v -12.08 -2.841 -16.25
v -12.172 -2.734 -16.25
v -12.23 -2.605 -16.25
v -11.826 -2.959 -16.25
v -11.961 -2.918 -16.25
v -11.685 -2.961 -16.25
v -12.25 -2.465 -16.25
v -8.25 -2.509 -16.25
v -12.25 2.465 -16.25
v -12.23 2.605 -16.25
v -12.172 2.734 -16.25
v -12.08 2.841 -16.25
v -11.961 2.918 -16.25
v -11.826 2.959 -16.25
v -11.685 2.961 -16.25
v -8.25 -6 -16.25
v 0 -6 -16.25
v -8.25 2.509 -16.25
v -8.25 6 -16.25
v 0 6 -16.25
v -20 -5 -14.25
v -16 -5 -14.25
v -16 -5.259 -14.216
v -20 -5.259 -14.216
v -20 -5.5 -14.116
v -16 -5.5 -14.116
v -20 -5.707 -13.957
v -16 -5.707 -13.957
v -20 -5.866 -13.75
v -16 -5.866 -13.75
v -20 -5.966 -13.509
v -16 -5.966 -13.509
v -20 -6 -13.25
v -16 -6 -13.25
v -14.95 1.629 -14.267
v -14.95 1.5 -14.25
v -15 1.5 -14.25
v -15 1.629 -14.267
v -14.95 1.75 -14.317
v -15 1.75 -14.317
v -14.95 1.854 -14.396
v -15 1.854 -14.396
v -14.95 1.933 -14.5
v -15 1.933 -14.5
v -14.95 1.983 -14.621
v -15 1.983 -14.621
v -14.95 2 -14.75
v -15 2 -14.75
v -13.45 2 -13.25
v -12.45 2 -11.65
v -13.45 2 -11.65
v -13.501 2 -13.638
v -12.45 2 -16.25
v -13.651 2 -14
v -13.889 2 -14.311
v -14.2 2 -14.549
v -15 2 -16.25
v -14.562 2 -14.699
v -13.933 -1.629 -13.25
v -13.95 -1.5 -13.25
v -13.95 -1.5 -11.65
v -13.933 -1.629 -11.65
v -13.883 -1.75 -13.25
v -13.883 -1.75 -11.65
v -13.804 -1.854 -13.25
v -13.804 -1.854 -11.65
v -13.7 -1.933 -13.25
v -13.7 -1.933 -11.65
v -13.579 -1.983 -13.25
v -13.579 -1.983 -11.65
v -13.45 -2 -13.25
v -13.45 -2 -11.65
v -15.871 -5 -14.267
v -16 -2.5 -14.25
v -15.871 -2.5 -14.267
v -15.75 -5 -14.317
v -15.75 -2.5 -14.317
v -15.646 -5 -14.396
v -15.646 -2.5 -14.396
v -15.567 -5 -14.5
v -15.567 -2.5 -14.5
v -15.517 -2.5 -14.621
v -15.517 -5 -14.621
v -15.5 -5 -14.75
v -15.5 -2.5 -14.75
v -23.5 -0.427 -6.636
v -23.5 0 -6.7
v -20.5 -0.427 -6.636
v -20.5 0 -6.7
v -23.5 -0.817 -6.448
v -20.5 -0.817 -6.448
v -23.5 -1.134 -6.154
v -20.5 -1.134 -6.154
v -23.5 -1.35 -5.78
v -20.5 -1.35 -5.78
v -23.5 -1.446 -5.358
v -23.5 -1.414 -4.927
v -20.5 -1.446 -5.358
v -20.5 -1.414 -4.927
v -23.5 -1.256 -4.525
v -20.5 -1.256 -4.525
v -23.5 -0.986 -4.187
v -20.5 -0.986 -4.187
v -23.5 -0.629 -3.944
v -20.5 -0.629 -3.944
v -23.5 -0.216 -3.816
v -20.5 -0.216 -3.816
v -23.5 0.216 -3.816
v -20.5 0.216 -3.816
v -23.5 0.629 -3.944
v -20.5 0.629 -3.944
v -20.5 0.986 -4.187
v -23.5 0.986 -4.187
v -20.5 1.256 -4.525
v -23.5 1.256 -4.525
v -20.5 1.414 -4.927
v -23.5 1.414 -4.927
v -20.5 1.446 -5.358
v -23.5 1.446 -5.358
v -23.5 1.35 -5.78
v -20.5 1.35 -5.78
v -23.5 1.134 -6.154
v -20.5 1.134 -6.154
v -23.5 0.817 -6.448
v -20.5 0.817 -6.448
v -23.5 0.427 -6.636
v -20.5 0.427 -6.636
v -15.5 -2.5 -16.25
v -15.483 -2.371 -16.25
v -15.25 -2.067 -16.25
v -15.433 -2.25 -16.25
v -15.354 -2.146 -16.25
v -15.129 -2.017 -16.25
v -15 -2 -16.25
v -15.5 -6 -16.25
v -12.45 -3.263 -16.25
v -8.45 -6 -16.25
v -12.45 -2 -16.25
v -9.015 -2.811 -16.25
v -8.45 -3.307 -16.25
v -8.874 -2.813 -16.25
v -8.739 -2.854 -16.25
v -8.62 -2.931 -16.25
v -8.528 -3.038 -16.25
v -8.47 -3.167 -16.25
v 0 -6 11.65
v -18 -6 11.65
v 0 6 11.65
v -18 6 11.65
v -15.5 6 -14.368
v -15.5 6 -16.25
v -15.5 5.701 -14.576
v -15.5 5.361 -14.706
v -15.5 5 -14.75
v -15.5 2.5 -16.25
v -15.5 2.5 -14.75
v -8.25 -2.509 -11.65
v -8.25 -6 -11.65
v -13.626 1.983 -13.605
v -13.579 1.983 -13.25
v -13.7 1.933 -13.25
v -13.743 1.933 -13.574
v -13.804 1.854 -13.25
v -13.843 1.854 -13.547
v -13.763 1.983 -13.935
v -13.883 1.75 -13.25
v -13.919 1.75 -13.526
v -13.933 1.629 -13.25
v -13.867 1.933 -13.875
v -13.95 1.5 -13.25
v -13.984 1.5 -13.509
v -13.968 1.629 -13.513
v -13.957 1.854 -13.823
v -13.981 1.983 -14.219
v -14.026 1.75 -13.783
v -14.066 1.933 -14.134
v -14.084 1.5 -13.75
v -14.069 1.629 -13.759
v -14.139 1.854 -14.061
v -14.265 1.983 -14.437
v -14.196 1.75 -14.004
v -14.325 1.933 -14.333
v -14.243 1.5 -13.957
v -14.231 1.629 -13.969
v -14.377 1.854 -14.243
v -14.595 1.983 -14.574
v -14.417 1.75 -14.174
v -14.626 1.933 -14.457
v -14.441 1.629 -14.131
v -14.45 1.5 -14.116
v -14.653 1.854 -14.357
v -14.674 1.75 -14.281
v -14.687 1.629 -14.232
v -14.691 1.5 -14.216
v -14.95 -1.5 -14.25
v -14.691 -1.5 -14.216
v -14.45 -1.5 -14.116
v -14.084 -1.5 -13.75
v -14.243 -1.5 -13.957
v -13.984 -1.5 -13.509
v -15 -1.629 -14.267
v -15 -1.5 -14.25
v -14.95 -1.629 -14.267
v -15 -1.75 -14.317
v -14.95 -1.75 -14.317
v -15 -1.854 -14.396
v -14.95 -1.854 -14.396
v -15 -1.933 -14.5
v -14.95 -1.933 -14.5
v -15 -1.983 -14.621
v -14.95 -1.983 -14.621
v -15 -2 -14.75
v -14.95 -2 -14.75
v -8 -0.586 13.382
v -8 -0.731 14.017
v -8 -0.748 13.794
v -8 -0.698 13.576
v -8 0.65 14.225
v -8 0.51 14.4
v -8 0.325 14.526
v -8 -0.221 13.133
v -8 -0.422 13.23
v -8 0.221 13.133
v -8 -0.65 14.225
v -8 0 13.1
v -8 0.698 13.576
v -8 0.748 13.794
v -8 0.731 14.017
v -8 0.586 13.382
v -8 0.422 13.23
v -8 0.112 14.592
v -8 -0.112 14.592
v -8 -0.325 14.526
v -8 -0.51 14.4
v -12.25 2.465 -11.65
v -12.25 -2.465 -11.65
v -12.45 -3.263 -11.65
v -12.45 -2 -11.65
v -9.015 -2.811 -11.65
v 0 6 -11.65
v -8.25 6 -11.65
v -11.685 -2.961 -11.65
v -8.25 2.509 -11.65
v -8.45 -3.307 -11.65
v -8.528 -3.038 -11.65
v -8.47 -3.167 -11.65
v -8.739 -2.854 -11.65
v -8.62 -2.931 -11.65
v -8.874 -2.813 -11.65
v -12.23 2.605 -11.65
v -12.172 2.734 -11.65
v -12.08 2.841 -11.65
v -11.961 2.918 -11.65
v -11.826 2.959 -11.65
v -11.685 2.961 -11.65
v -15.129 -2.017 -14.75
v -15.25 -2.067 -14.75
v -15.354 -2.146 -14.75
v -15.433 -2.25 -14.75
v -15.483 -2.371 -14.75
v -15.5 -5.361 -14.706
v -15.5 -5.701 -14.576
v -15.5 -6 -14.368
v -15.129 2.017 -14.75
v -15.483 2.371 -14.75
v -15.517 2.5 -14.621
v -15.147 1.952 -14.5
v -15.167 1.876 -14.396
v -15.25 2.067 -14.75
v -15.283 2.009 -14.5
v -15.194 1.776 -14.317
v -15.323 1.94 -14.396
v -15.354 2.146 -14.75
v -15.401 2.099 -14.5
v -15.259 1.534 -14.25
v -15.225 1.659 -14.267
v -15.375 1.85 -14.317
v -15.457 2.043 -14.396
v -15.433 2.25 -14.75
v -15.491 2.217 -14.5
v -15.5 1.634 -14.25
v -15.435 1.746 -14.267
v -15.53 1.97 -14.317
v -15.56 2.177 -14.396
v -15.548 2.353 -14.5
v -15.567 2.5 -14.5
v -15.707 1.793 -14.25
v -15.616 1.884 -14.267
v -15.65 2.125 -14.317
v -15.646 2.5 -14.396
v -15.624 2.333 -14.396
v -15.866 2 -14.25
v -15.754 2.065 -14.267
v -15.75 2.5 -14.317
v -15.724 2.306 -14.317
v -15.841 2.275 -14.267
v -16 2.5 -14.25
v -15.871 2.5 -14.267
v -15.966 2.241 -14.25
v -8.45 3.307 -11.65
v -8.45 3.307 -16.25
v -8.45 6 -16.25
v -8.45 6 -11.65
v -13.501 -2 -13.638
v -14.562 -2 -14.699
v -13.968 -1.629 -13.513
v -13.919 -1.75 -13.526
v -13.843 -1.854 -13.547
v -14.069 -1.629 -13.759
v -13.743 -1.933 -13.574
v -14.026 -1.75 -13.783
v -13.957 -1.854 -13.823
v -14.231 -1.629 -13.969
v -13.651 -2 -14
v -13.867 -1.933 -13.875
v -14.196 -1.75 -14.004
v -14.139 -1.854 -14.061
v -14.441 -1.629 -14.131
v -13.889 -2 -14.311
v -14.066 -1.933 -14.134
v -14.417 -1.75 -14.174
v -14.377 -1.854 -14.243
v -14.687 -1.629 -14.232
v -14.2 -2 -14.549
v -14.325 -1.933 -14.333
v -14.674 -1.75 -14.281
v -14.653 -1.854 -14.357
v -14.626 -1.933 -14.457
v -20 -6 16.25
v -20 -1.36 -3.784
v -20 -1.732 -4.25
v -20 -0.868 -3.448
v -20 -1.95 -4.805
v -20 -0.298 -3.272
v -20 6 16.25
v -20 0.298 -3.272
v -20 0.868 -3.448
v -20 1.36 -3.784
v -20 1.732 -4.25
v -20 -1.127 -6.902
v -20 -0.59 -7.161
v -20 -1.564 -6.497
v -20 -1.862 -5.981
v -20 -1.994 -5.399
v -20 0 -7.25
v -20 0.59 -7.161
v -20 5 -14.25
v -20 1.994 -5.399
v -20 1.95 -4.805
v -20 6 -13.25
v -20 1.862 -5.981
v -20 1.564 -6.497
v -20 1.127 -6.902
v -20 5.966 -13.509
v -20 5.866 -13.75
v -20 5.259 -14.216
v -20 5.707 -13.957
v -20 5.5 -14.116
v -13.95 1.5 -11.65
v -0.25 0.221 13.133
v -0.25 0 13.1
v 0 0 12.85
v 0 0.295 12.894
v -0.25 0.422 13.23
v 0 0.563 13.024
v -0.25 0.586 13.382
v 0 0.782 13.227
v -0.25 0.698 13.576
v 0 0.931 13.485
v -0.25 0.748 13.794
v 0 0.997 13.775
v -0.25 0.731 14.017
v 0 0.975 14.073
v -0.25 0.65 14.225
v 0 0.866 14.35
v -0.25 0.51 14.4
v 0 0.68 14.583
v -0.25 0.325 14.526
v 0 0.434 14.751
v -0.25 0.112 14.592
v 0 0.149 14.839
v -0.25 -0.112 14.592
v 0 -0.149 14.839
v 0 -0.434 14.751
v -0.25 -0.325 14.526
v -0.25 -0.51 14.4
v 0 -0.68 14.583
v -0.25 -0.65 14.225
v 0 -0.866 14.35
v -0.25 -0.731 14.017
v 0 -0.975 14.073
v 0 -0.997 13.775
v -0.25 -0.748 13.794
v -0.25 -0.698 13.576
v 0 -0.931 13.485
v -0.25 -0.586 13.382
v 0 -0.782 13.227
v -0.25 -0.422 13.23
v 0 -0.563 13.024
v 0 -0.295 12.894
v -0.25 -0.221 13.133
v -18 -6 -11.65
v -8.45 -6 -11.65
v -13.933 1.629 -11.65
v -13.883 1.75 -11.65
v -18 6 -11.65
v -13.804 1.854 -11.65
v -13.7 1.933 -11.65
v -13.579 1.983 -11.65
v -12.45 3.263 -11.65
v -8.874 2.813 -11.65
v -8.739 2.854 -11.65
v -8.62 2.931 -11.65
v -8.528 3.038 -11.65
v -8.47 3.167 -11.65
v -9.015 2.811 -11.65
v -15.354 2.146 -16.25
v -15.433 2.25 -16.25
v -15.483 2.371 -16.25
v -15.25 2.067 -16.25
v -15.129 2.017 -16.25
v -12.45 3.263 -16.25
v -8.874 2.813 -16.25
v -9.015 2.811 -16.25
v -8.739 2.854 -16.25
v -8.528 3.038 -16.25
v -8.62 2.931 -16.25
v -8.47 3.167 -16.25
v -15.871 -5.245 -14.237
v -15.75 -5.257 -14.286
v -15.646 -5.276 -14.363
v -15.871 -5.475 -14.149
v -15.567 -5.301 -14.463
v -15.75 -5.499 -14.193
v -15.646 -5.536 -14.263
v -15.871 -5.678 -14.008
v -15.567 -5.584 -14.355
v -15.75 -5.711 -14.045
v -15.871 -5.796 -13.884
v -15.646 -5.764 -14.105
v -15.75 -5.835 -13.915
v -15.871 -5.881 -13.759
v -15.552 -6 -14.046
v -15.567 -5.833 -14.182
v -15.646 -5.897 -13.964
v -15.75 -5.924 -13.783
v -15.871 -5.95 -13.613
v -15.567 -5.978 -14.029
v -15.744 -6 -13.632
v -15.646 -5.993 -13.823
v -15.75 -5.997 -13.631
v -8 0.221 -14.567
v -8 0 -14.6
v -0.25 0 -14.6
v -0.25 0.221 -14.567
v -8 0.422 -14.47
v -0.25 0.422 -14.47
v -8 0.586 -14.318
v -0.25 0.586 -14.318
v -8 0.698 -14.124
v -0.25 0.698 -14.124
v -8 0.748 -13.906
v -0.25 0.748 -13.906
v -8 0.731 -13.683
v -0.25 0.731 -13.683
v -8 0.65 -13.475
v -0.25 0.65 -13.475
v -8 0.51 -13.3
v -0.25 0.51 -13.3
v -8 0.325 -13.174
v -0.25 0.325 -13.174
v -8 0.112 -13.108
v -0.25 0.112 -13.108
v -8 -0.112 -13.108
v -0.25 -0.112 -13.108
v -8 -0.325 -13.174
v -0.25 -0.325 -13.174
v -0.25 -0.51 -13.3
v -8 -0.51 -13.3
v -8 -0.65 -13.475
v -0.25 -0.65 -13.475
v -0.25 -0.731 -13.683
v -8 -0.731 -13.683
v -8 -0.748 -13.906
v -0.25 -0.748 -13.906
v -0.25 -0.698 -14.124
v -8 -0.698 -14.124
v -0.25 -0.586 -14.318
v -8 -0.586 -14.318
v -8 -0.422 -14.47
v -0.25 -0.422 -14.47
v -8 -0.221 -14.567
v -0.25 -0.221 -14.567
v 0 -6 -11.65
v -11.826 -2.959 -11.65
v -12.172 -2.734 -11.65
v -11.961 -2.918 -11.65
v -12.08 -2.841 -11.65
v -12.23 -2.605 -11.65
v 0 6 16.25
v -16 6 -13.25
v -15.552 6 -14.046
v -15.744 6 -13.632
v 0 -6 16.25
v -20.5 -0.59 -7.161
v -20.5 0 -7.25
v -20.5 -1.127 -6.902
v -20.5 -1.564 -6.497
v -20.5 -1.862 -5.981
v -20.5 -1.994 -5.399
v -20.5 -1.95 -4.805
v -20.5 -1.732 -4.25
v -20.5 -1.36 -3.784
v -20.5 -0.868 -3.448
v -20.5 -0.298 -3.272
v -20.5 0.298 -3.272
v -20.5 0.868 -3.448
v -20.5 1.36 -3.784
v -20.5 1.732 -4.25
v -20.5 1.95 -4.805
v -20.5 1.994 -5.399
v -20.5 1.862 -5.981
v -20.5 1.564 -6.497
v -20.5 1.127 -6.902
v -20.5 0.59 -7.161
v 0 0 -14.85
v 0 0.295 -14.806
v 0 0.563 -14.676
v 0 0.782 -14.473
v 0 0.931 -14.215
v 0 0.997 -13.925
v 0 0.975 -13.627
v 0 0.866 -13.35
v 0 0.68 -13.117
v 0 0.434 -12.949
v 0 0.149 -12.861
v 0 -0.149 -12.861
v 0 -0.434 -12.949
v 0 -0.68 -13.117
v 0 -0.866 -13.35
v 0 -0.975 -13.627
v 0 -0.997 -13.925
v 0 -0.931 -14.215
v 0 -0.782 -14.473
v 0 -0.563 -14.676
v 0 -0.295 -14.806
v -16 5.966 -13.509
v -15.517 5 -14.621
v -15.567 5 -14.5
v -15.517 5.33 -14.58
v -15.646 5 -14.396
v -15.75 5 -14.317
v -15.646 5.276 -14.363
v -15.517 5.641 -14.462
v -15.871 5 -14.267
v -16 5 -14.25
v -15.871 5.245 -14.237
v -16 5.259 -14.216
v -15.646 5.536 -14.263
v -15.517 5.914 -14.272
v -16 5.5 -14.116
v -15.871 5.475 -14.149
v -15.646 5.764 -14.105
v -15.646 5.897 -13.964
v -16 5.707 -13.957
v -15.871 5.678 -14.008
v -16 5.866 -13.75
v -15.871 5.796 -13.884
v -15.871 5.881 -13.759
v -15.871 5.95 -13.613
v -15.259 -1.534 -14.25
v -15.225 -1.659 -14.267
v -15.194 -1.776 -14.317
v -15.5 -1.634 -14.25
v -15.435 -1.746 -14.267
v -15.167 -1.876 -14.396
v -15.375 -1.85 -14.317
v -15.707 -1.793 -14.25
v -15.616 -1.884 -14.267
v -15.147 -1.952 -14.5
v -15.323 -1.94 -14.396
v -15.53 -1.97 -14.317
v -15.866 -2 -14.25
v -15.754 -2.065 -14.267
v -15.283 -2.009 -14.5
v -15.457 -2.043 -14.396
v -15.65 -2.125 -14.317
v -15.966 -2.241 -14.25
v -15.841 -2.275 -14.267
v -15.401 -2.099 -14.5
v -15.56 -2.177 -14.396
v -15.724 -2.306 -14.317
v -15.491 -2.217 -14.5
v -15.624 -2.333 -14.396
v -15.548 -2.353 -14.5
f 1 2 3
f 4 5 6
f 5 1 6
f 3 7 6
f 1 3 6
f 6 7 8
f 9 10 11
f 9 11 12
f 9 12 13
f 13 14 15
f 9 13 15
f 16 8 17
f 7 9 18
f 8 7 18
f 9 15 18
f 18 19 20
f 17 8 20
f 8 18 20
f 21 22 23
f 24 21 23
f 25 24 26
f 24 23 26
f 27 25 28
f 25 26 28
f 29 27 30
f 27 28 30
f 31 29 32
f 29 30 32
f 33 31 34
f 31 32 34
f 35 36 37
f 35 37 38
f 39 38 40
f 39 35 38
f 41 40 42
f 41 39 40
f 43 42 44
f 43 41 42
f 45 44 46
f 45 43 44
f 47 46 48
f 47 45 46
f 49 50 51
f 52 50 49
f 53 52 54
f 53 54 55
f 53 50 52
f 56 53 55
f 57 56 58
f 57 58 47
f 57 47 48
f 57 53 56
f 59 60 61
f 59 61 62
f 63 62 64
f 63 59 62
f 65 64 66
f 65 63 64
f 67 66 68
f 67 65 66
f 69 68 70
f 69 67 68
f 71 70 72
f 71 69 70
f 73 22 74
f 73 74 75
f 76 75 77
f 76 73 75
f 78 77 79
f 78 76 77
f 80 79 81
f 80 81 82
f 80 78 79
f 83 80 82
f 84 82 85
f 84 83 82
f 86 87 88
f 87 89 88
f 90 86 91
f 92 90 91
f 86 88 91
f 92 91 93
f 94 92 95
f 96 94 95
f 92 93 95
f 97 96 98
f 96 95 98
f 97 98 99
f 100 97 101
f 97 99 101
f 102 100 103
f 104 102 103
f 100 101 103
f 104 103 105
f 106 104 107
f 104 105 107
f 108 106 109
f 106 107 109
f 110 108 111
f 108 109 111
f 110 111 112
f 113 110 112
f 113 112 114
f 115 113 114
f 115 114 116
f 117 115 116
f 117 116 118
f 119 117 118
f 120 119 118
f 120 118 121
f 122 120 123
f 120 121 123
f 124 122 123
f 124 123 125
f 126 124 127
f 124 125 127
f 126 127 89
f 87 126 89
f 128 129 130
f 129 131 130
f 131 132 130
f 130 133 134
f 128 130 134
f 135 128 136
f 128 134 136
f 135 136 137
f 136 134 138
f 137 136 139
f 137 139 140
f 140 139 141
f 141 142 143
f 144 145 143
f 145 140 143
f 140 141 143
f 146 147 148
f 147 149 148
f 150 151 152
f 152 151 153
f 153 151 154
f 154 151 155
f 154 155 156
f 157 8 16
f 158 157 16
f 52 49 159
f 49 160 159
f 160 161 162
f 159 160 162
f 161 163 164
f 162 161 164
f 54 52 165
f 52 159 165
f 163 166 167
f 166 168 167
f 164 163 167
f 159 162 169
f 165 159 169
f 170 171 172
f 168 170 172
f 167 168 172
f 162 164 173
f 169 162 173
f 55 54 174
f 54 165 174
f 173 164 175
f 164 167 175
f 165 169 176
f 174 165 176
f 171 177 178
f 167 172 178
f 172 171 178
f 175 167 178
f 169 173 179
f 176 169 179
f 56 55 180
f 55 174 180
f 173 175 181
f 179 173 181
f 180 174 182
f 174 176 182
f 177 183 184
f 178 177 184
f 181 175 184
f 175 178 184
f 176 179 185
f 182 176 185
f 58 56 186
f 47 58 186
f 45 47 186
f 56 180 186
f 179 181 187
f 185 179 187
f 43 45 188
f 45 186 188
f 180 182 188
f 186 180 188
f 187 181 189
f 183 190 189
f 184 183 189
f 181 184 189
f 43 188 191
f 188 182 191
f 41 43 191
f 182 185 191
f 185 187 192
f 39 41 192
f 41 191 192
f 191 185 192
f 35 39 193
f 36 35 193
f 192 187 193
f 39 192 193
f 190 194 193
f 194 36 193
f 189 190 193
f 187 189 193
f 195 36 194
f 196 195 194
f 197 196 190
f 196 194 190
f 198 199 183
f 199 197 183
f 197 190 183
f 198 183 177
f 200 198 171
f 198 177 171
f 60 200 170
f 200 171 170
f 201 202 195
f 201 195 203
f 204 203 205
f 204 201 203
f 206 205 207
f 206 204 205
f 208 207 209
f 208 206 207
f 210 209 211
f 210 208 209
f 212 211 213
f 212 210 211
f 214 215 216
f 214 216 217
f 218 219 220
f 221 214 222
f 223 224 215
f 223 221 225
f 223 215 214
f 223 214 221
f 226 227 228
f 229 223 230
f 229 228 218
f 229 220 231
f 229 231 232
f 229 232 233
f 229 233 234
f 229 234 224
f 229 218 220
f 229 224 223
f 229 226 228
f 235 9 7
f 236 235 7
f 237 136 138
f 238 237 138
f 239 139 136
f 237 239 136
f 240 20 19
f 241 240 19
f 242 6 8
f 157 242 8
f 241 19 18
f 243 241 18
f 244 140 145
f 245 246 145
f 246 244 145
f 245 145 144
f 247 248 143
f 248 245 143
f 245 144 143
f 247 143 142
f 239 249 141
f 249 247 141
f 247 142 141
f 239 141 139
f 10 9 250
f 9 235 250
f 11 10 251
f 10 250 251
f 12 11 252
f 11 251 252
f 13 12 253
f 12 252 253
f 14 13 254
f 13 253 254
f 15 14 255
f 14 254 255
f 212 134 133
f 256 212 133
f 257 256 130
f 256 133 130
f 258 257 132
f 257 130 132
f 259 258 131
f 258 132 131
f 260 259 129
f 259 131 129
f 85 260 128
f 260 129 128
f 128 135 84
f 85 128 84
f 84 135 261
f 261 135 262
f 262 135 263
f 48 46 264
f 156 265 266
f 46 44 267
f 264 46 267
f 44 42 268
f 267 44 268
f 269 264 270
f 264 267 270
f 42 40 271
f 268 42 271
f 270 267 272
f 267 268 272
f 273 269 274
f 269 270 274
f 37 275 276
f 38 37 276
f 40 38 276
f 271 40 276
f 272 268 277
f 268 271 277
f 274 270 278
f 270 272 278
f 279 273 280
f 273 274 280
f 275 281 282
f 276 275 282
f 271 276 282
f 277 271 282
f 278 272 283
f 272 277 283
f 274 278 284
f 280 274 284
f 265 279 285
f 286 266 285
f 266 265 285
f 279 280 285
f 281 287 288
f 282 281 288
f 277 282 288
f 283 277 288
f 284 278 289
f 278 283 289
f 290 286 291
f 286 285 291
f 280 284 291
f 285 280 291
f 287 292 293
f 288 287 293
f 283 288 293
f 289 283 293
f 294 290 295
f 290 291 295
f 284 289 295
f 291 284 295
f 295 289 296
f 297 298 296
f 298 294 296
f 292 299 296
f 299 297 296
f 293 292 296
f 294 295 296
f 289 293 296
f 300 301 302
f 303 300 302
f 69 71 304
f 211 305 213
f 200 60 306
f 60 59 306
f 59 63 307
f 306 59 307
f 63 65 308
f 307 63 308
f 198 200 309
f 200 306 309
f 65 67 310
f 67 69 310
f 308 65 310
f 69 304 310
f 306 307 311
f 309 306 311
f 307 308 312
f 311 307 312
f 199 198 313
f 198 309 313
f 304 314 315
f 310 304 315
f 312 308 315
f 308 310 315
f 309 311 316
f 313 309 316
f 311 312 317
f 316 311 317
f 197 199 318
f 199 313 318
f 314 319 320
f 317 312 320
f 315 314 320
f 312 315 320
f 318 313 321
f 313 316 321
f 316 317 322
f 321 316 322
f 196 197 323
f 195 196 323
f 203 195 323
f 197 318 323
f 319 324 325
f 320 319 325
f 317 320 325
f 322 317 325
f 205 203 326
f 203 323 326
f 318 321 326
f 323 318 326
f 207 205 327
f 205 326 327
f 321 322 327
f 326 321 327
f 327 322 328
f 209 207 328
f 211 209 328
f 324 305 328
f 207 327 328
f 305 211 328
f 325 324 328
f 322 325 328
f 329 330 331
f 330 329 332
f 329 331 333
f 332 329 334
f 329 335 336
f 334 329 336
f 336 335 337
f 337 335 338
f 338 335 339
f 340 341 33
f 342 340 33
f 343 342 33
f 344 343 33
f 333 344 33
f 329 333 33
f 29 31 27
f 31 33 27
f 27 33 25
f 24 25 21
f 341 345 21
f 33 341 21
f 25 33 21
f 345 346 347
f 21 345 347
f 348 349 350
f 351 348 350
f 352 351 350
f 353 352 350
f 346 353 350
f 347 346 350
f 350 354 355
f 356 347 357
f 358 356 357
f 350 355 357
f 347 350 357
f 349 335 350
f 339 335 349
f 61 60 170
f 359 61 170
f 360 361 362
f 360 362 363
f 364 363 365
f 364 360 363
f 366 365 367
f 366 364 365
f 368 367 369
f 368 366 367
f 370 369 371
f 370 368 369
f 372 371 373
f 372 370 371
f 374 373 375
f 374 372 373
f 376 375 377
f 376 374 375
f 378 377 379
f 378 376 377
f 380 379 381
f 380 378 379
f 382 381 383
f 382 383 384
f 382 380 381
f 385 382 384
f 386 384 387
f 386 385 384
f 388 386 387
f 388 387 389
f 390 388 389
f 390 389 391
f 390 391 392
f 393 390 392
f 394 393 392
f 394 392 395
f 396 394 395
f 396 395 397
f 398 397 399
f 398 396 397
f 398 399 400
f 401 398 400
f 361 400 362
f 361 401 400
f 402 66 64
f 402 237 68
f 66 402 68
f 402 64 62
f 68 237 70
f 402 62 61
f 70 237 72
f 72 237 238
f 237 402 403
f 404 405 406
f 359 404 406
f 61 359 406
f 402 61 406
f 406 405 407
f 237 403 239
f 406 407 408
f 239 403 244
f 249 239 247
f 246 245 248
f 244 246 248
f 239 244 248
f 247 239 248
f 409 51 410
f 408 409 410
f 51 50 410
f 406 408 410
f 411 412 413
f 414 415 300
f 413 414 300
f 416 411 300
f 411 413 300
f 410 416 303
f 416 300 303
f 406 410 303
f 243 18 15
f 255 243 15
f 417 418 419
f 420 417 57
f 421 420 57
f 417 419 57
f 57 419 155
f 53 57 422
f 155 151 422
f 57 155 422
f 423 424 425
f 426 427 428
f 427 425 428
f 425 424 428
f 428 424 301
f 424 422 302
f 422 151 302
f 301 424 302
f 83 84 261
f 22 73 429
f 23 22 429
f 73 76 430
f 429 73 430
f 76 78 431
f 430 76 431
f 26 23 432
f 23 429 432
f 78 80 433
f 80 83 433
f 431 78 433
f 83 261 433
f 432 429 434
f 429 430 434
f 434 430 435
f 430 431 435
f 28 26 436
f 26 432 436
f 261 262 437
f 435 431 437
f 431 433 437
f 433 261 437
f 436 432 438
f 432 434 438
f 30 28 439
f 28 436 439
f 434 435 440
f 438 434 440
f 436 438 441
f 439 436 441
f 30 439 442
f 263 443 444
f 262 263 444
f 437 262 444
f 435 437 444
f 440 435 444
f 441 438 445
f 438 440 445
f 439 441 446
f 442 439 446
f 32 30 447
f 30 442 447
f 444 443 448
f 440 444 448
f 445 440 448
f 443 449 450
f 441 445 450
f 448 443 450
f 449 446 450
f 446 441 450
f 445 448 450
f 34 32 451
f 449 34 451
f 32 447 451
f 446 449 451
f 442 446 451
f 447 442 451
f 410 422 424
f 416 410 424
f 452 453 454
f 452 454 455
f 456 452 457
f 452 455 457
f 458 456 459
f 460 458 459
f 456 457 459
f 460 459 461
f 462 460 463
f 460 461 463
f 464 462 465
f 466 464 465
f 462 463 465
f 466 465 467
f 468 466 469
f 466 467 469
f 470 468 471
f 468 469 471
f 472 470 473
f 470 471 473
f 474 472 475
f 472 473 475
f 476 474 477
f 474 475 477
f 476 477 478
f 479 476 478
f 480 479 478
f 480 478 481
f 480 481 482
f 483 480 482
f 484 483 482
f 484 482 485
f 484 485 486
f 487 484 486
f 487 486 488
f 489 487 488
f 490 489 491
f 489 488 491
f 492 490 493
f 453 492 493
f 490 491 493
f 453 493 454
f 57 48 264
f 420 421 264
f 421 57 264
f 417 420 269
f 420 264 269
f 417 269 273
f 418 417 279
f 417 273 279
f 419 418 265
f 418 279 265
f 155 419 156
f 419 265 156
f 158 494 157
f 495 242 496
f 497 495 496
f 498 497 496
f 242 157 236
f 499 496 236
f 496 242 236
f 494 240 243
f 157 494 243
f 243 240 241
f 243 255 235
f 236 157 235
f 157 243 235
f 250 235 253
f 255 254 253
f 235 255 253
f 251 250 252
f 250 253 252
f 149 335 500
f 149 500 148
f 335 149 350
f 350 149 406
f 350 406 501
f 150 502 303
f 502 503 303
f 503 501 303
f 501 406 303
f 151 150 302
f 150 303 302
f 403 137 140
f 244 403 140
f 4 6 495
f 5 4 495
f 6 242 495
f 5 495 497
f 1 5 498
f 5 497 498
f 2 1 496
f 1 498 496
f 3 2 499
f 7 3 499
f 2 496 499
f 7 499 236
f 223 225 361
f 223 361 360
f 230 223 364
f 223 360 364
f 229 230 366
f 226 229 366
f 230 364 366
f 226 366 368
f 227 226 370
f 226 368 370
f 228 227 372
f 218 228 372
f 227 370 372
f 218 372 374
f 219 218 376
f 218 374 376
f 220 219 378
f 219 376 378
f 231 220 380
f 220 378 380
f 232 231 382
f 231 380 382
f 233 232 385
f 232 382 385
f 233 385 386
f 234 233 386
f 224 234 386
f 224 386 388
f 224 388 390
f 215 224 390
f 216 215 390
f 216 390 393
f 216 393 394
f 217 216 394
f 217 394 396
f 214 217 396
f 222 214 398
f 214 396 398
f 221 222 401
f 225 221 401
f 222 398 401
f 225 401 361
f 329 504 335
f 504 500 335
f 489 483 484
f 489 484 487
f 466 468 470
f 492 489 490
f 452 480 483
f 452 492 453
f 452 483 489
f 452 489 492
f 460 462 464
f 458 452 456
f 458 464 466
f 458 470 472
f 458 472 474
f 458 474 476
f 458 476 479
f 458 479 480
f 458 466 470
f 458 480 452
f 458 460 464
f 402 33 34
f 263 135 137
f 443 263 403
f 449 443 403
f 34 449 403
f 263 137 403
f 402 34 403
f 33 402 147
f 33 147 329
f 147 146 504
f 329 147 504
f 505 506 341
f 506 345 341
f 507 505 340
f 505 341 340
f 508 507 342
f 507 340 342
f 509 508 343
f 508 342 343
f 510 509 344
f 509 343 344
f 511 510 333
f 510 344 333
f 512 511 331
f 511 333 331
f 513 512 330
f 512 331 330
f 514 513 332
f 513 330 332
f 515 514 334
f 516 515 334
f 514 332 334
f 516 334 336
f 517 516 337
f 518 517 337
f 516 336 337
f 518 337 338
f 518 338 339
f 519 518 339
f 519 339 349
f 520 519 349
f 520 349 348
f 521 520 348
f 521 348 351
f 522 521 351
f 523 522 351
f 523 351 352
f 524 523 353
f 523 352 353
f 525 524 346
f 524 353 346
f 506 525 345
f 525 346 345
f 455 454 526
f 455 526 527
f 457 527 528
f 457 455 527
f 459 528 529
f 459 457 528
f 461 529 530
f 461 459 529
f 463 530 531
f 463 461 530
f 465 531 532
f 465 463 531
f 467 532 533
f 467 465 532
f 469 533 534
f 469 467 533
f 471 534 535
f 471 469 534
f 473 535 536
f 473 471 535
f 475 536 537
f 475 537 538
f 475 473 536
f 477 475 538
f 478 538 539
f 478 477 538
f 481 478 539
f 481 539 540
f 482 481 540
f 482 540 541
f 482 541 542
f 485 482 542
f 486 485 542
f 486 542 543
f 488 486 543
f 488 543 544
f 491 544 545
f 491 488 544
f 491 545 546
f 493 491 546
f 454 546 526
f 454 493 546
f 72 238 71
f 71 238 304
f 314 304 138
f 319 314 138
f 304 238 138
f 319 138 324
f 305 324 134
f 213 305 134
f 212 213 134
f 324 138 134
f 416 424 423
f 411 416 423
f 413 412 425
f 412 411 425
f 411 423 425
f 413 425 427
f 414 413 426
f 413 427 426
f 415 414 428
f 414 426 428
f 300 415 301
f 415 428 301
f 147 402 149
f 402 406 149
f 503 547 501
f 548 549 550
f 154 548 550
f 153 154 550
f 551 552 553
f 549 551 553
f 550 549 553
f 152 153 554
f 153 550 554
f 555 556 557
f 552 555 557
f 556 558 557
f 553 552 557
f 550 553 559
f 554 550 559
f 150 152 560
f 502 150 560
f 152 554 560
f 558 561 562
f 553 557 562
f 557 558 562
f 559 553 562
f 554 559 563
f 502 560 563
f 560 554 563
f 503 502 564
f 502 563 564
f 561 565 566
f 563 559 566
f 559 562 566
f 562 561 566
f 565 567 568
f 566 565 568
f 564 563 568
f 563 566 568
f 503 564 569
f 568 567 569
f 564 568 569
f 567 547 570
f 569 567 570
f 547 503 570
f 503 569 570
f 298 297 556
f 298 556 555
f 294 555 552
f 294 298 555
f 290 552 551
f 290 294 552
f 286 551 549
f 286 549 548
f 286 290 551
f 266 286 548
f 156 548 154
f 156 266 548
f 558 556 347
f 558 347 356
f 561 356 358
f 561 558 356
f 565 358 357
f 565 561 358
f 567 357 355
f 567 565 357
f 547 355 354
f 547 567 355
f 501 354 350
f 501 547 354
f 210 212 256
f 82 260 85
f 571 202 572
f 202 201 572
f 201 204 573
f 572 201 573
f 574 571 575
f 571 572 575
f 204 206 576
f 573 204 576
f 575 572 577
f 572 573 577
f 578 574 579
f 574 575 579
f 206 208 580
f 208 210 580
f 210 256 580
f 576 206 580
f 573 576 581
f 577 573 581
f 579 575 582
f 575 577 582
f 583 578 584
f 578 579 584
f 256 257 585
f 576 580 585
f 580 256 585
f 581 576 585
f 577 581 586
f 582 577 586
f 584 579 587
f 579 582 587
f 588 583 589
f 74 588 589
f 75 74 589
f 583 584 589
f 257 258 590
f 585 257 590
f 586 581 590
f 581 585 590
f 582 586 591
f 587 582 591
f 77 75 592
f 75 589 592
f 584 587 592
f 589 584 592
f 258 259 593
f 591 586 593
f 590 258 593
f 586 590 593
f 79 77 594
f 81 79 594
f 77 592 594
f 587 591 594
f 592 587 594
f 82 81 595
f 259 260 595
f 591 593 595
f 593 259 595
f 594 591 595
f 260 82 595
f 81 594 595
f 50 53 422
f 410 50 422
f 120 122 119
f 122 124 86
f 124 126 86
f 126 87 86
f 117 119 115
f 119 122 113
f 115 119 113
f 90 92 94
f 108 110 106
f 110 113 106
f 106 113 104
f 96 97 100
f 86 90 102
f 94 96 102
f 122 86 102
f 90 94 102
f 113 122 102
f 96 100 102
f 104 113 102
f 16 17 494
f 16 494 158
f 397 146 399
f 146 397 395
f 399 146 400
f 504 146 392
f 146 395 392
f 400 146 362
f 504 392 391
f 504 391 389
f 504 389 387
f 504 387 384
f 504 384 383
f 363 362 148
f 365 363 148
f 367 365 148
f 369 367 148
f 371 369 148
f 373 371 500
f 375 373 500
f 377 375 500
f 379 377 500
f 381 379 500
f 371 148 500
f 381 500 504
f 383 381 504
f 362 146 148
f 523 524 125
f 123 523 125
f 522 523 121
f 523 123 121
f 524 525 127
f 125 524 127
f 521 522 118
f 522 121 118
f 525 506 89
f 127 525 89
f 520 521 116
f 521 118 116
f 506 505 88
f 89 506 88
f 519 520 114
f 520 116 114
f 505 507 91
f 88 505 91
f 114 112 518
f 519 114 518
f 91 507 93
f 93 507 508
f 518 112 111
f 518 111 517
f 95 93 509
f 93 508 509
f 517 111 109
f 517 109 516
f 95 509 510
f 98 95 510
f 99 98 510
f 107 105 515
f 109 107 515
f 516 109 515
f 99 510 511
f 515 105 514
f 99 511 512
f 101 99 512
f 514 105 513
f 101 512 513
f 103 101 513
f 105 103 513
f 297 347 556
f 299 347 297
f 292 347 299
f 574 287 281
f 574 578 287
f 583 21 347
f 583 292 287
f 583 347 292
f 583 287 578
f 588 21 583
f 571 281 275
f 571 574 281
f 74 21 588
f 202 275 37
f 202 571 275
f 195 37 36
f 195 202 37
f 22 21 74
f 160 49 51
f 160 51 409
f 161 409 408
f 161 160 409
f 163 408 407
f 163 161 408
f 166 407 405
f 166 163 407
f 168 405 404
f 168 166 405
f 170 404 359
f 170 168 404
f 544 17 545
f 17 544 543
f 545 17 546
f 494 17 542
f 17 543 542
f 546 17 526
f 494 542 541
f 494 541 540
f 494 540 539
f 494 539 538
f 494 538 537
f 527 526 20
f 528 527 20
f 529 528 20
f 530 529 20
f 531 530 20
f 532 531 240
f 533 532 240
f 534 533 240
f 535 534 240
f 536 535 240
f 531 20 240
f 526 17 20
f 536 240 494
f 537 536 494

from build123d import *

# Parameters (mm, degrees)
BOSS_EXTRUDE1_DEPTH = 6
SKETCH4_R           = 0.75
CUT_EXTRUDE3_DEPTH  = 8
CHAMFER1_SIZE       = 0.25
CUT_EXTRUDE1_REACH  = 40.63
SKETCH2_W           = 1.5
SKETCH2_H           = 4
SKETCH5_W           = 6.05
SKETCH5_H           = 4
CUT_EXTRUDE5_DEPTH  = 2
SKETCH6_W           = 4.5
SKETCH6_H           = 2
CUT_EXTRUDE6_DEPTH  = 29.426440157
FILLET7_R           = 1
CUT_EXTRUDE2_REACH  = 40.63
FILLET9_R           = 0.5
FILLET3_R           = 0.5


with BuildPart() as part:
    # Sketch1 → Boss-Extrude1 (new, symmetric)
    with BuildSketch(Plane(origin=(0, 0, 0), x_dir=(1, 0, 0), z_dir=(0, 1, 0))):
        Polygon((0, 16.25), (0, 11.65), (-18, 11.65), (-18, -11.65), (0, -11.65), (0, -16.25), (-20, -16.25), (-20, 16.25), align=None)
    extrude(amount=BOSS_EXTRUDE1_DEPTH, both=True)

    # Sketch4 → Cut-Extrude3 (cut)
    with BuildSketch(Plane(origin=(0, 0, 0), x_dir=(0, 0, -1), z_dir=(1, 0, 0))):
        with Locations((13.85, 0)):
            Circle(SKETCH4_R)
        with Locations((-13.85, 0)):
            Circle(SKETCH4_R)
    extrude(amount=-CUT_EXTRUDE3_DEPTH, mode=Mode.SUBTRACT)

    # Chamfer1
    chamfer1_edges = [part.edges().sort_by_distance(p)[0] for p in [
        (0, 0, -13.1),
        (0, 0, 14.6),
    ]]
    chamfer(chamfer1_edges, length=CHAMFER1_SIZE)

    # Sketch2 → Cut-Extrude1 (cut, up to next)
    with BuildSketch(Plane(origin=(0, 0, -16.25), x_dir=(-1, 0, 0), z_dir=(0, 0, -1)), mode=Mode.PRIVATE) as cut_extrude1_sk1:
        with Locations((13.2, 0)):
            Rectangle(SKETCH2_W, SKETCH2_H)
    cut_extrude1_tool1 = extrude(cut_extrude1_sk1.sketch, amount=-CUT_EXTRUDE1_REACH, mode=Mode.PRIVATE) & part.part
    add(cut_extrude1_tool1.solids().sort_by_distance((-13.2, 0, -16.25))[0], mode=Mode.SUBTRACT)

    # Sketch5 → Cut-Extrude5 (cut)
    with BuildSketch(Plane(origin=(0, 0, -16.25), x_dir=(-1, 0, 0), z_dir=(0, 0, -1))):
        with Locations((16.975, 0)):
            Rectangle(SKETCH5_W, SKETCH5_H)
    extrude(amount=-CUT_EXTRUDE5_DEPTH, mode=Mode.SUBTRACT)

    # Sketch6 → Cut-Extrude6 (cut, through all)
    with BuildSketch(Plane.XZ.offset(6)):
        with Locations((-17.75, -15.25)):
            Rectangle(SKETCH6_W, SKETCH6_H)
    extrude(amount=-CUT_EXTRUDE6_DEPTH, mode=Mode.SUBTRACT)

    # Fillet7
    fillet7_edges = [part.edges().sort_by_distance(p)[0] for p in [
        (-13.95, 0, -14.25),
        (-17.75, 6, -14.25),
        (-17.75, -6, -14.25),
    ]]
    fillet(fillet7_edges, radius=FILLET7_R)

    # Sketch3 → Cut-Extrude2 (cut, up to next)
    with BuildSketch(Plane(origin=(0, 0, -16.25), x_dir=(-1, 0, 0), z_dir=(0, 0, -1)), mode=Mode.PRIVATE) as cut_extrude2_sk1:
        Polygon((8.45, -6), (8.45, -2.736695005), (12.45, -3.263304995), (12.45, 3.263304995), (8.45, 2.736695005), (8.45, 6), (8.25, 6), (8.25, 2.508638713), (12.25, 3.035248704), (12.25, -3.035248704), (8.25, -2.508638713), (8.25, -6), align=None)
    cut_extrude2_tool1 = extrude(cut_extrude2_sk1.sketch, amount=-CUT_EXTRUDE2_REACH, mode=Mode.PRIVATE) & part.part
    add(cut_extrude2_tool1.solids().sort_by_distance((-8.322862, -4.368348, -16.25))[0], mode=Mode.SUBTRACT)


with BuildPart() as cut_extrude2_piece_1:
    # of the separate pieces the step leaves, piece 1, a body of its own (cut_extrude2_pieces)
    add(part.part.solids().sort_by_distance((-13.95, -2, -13.25))[0])

    # Fillet9
    # the kernel refuses this fillet: 0.5 mm, written as the material it takes off along each edge
    with BuildSketch(Plane(origin=(-15.5, -2, -17.5), x_dir=(1, 0, 0), z_dir=(0, 0, 1)), Plane(origin=(-15.5, 2, -14.25), x_dir=(1, 0, 0), z_dir=(0, 0, -1))) as fillet9_piece_1:
        with BuildLine():
            CenterArc((FILLET9_R, -FILLET9_R), FILLET9_R, 90, 90)
            Line((0, -FILLET9_R), (0, 0))
            Line((0, 0), (FILLET9_R, 0))
        make_face()
    extrude(amount=3.25, mode=Mode.SUBTRACT)
    with BuildSketch(Plane(origin=(-8.45, 2.736695005, -17.675351823), x_dir=(-0.9914448613738108, 0.1305261922200488, 0), z_dir=(0, 0, 1)), Plane(origin=(-8.45, -2.736695005, -17.675351823), x_dir=(0, -1, 0), z_dir=(0, 0, 1))) as fillet9_piece_2:
        with BuildLine():
            CenterArc((FILLET9_R * 1.14028145817, -FILLET9_R), FILLET9_R, 90, 97.5)
            Line((FILLET9_R * 0.148836596794, -FILLET9_R * 1.13052619222), (0, 0))
            Line((0, 0), (FILLET9_R * 1.14028145817, 0))
        make_face()
    extrude(amount=7.450703645, mode=Mode.SUBTRACT)
    # the kernel refuses this fillet: 0.5 mm, written as the material it adds along each edge
    with BuildSketch(Plane(origin=(-13.95, -2, -13.25), x_dir=(0, 1, 0), z_dir=(0, 0, 1))) as fillet9_2_piece_1:
        with BuildLine():
            CenterArc((FILLET9_R, -FILLET9_R), FILLET9_R, 90, 90)
            Line((0, -FILLET9_R), (0, 0))
            Line((0, 0), (FILLET9_R, 0))
        make_face()
    extrude(amount=1.6)
    with BuildSketch(Plane(origin=(-14.95, -2, -13.25), x_dir=(1, 0, 0), z_dir=(0, 0, 1))) as fillet9_2_piece_2:
        with BuildLine():
            CenterArc((1 + FILLET9_R, FILLET9_R), FILLET9_R, 180, 90)
            Line((1, FILLET9_R), (1, 0))
            Line((1, 0), (1 + FILLET9_R, 0))
        make_face()
    revolve(axis=Axis((-14.95, -2, -13.25), (0, 1, 0)), revolution_arc=90)
    with BuildSketch(Plane(origin=(-13.95, 2, -13.25), x_dir=(0, -1, 0), z_dir=(0, 0, 1))) as fillet9_2_piece_3:
        with BuildLine():
            CenterArc((FILLET9_R, FILLET9_R), FILLET9_R, 180, 90)
            Line((0, FILLET9_R), (0, 0))
            Line((0, 0), (FILLET9_R, 0))
        make_face()
    extrude(amount=1.6)
    with BuildSketch(Plane(origin=(-14.95, 2, -13.25), x_dir=(1, 0, 0), z_dir=(0, 0, 1))) as fillet9_2_piece_4:
        with BuildLine():
            CenterArc((1 + FILLET9_R, -FILLET9_R), FILLET9_R, 90, 90)
            Line((1 + FILLET9_R, 0), (1, 0))
            Line((1, 0), (1, -FILLET9_R))
        make_face()
    revolve(axis=Axis((-14.95, 2, -13.25), (0, 1, 0)), revolution_arc=90)
    with BuildSketch(Plane(origin=(-15.5, 2.5, -14.25), x_dir=(-1, 0, 0), z_dir=(0, 1, 0)), Plane(origin=(-15.5, -5, -14.25), x_dir=(-1, 0, 0), z_dir=(0, 1, 0))) as fillet9_2_piece_5:
        with BuildLine():
            CenterArc((FILLET9_R, -FILLET9_R), FILLET9_R, 90, 90)
            Line((0, -FILLET9_R), (0, 0))
            Line((0, 0), (FILLET9_R, 0))
        make_face()
    extrude(amount=2.5)
    with BuildSketch(Plane(origin=(-14.95, 2, -14.25), x_dir=(0, 0, -1), z_dir=(-1, 0, 0)), Plane(origin=(-15, -2, -14.25), x_dir=(0, 0, -1), z_dir=(1, 0, 0))) as fillet9_2_piece_6:
        with BuildLine():
            CenterArc((FILLET9_R, FILLET9_R), FILLET9_R, 180, 90)
            Line((0, FILLET9_R), (0, 0))
            Line((0, 0), (FILLET9_R, 0))
        make_face()
    extrude(amount=0.05)
    with BuildSketch(Plane(origin=(-15.5, 5, -13.25), x_dir=(0, 0, -1), z_dir=(0, -1, 0))) as fillet9_2_piece_7_section:
        with BuildLine():
            CenterArc((1 + FILLET9_R, -FILLET9_R), FILLET9_R, 90, 90)
            Line((1 + FILLET9_R, 0), (1, 0))
            Line((1, 0), (1, -FILLET9_R))
        make_face()
    fillet9_2_piece_7 = revolve(axis=Axis((-15.5, 5, -13.25), (1, 0, 0)), revolution_arc=161.648494619, mode=Mode.PRIVATE)
    fillet9_2_piece_7 = split(fillet9_2_piece_7, bisect_by=Plane(origin=(-15.636075231, 6, -13.981098286), z_dir=(0, -1, 0)), keep=Keep.TOP, mode=Mode.PRIVATE)
    add(fillet9_2_piece_7)
    with BuildSketch(Plane(origin=(-15.5, -5, -13.25), x_dir=(0, 0, -1), z_dir=(0, 1, 0))) as fillet9_2_piece_8_section:
        with BuildLine():
            CenterArc((1 + FILLET9_R, FILLET9_R), FILLET9_R, 180, 90)
            Line((1 + FILLET9_R, 0), (1, 0))
            Line((1, 0), (1, FILLET9_R))
        make_face()
    fillet9_2_piece_8 = revolve(axis=Axis((-15.5, -5, -13.25), (-1, 0, 0)), revolution_arc=161.648494619, mode=Mode.PRIVATE)
    fillet9_2_piece_8 = split(fillet9_2_piece_8, bisect_by=Plane(origin=(-15.636075231, -6, -13.981098286), z_dir=(0, 1, 0)), keep=Keep.TOP, mode=Mode.PRIVATE)
    add(fillet9_2_piece_8)
    with BuildSketch(Plane(origin=(-15, -2.5, -14.25), x_dir=(0, 1, 0), z_dir=(1, 0, 0))) as fillet9_2_piece_9:
        with BuildLine():
            CenterArc((0.5 + FILLET9_R, -FILLET9_R), FILLET9_R, 90, 90)
            Line((0.5, -FILLET9_R), (0.5, 0))
            Line((0.5, 0), (0.5 + FILLET9_R, 0))
        make_face()
    revolve(axis=Axis((-15, -2.5, -14.25), (0, 0, 1)), revolution_arc=90)
    with BuildSketch(Plane(origin=(-15, 2.5, -14.25), x_dir=(0, -1, 0), z_dir=(1, 0, 0))) as fillet9_2_piece_10:
        with BuildLine():
            CenterArc((0.5 + FILLET9_R, FILLET9_R), FILLET9_R, 180, 90)
            Line((0.5, FILLET9_R), (0.5, 0))
            Line((0.5, 0), (0.5 + FILLET9_R, 0))
        make_face()
    revolve(axis=Axis((-15, 2.5, -14.25), (0, 0, -1)), revolution_arc=90)

    # Sketch9 → Revolve2 (revolve)
    with BuildSketch(Plane(origin=(0, 0, 0), x_dir=(1, 0, 0), z_dir=(0, 1, 0))):
        Polygon((-20, 5.25), (-23.5, 5.25), (-23.5, 6.7), (-20.5, 6.7), (-20.5, 7.25), (-20, 7.25), align=None)
    revolve(axis=Axis((0, 0, -5.25), (-1, 0, 0)))


with BuildPart() as cut_extrude2_piece_2:
    # of the separate pieces the step leaves, piece 2, a body of its own (cut_extrude2_pieces)
    add(part.part.solids().sort_by_distance((0, 6, -11.65))[0])

    # Fillet3
    fillet3_edges = [cut_extrude2_piece_2.edges().sort_by_distance(p)[0] for p in [
        (-12.25, 3.035248704, -13.95),
        (-12.25, -3.035248704, -13.95),
    ]]
    fillet(fillet3_edges, radius=FILLET3_R)


solid = Compound([cut_extrude2_piece_1.part, cut_extrude2_piece_2.part])
